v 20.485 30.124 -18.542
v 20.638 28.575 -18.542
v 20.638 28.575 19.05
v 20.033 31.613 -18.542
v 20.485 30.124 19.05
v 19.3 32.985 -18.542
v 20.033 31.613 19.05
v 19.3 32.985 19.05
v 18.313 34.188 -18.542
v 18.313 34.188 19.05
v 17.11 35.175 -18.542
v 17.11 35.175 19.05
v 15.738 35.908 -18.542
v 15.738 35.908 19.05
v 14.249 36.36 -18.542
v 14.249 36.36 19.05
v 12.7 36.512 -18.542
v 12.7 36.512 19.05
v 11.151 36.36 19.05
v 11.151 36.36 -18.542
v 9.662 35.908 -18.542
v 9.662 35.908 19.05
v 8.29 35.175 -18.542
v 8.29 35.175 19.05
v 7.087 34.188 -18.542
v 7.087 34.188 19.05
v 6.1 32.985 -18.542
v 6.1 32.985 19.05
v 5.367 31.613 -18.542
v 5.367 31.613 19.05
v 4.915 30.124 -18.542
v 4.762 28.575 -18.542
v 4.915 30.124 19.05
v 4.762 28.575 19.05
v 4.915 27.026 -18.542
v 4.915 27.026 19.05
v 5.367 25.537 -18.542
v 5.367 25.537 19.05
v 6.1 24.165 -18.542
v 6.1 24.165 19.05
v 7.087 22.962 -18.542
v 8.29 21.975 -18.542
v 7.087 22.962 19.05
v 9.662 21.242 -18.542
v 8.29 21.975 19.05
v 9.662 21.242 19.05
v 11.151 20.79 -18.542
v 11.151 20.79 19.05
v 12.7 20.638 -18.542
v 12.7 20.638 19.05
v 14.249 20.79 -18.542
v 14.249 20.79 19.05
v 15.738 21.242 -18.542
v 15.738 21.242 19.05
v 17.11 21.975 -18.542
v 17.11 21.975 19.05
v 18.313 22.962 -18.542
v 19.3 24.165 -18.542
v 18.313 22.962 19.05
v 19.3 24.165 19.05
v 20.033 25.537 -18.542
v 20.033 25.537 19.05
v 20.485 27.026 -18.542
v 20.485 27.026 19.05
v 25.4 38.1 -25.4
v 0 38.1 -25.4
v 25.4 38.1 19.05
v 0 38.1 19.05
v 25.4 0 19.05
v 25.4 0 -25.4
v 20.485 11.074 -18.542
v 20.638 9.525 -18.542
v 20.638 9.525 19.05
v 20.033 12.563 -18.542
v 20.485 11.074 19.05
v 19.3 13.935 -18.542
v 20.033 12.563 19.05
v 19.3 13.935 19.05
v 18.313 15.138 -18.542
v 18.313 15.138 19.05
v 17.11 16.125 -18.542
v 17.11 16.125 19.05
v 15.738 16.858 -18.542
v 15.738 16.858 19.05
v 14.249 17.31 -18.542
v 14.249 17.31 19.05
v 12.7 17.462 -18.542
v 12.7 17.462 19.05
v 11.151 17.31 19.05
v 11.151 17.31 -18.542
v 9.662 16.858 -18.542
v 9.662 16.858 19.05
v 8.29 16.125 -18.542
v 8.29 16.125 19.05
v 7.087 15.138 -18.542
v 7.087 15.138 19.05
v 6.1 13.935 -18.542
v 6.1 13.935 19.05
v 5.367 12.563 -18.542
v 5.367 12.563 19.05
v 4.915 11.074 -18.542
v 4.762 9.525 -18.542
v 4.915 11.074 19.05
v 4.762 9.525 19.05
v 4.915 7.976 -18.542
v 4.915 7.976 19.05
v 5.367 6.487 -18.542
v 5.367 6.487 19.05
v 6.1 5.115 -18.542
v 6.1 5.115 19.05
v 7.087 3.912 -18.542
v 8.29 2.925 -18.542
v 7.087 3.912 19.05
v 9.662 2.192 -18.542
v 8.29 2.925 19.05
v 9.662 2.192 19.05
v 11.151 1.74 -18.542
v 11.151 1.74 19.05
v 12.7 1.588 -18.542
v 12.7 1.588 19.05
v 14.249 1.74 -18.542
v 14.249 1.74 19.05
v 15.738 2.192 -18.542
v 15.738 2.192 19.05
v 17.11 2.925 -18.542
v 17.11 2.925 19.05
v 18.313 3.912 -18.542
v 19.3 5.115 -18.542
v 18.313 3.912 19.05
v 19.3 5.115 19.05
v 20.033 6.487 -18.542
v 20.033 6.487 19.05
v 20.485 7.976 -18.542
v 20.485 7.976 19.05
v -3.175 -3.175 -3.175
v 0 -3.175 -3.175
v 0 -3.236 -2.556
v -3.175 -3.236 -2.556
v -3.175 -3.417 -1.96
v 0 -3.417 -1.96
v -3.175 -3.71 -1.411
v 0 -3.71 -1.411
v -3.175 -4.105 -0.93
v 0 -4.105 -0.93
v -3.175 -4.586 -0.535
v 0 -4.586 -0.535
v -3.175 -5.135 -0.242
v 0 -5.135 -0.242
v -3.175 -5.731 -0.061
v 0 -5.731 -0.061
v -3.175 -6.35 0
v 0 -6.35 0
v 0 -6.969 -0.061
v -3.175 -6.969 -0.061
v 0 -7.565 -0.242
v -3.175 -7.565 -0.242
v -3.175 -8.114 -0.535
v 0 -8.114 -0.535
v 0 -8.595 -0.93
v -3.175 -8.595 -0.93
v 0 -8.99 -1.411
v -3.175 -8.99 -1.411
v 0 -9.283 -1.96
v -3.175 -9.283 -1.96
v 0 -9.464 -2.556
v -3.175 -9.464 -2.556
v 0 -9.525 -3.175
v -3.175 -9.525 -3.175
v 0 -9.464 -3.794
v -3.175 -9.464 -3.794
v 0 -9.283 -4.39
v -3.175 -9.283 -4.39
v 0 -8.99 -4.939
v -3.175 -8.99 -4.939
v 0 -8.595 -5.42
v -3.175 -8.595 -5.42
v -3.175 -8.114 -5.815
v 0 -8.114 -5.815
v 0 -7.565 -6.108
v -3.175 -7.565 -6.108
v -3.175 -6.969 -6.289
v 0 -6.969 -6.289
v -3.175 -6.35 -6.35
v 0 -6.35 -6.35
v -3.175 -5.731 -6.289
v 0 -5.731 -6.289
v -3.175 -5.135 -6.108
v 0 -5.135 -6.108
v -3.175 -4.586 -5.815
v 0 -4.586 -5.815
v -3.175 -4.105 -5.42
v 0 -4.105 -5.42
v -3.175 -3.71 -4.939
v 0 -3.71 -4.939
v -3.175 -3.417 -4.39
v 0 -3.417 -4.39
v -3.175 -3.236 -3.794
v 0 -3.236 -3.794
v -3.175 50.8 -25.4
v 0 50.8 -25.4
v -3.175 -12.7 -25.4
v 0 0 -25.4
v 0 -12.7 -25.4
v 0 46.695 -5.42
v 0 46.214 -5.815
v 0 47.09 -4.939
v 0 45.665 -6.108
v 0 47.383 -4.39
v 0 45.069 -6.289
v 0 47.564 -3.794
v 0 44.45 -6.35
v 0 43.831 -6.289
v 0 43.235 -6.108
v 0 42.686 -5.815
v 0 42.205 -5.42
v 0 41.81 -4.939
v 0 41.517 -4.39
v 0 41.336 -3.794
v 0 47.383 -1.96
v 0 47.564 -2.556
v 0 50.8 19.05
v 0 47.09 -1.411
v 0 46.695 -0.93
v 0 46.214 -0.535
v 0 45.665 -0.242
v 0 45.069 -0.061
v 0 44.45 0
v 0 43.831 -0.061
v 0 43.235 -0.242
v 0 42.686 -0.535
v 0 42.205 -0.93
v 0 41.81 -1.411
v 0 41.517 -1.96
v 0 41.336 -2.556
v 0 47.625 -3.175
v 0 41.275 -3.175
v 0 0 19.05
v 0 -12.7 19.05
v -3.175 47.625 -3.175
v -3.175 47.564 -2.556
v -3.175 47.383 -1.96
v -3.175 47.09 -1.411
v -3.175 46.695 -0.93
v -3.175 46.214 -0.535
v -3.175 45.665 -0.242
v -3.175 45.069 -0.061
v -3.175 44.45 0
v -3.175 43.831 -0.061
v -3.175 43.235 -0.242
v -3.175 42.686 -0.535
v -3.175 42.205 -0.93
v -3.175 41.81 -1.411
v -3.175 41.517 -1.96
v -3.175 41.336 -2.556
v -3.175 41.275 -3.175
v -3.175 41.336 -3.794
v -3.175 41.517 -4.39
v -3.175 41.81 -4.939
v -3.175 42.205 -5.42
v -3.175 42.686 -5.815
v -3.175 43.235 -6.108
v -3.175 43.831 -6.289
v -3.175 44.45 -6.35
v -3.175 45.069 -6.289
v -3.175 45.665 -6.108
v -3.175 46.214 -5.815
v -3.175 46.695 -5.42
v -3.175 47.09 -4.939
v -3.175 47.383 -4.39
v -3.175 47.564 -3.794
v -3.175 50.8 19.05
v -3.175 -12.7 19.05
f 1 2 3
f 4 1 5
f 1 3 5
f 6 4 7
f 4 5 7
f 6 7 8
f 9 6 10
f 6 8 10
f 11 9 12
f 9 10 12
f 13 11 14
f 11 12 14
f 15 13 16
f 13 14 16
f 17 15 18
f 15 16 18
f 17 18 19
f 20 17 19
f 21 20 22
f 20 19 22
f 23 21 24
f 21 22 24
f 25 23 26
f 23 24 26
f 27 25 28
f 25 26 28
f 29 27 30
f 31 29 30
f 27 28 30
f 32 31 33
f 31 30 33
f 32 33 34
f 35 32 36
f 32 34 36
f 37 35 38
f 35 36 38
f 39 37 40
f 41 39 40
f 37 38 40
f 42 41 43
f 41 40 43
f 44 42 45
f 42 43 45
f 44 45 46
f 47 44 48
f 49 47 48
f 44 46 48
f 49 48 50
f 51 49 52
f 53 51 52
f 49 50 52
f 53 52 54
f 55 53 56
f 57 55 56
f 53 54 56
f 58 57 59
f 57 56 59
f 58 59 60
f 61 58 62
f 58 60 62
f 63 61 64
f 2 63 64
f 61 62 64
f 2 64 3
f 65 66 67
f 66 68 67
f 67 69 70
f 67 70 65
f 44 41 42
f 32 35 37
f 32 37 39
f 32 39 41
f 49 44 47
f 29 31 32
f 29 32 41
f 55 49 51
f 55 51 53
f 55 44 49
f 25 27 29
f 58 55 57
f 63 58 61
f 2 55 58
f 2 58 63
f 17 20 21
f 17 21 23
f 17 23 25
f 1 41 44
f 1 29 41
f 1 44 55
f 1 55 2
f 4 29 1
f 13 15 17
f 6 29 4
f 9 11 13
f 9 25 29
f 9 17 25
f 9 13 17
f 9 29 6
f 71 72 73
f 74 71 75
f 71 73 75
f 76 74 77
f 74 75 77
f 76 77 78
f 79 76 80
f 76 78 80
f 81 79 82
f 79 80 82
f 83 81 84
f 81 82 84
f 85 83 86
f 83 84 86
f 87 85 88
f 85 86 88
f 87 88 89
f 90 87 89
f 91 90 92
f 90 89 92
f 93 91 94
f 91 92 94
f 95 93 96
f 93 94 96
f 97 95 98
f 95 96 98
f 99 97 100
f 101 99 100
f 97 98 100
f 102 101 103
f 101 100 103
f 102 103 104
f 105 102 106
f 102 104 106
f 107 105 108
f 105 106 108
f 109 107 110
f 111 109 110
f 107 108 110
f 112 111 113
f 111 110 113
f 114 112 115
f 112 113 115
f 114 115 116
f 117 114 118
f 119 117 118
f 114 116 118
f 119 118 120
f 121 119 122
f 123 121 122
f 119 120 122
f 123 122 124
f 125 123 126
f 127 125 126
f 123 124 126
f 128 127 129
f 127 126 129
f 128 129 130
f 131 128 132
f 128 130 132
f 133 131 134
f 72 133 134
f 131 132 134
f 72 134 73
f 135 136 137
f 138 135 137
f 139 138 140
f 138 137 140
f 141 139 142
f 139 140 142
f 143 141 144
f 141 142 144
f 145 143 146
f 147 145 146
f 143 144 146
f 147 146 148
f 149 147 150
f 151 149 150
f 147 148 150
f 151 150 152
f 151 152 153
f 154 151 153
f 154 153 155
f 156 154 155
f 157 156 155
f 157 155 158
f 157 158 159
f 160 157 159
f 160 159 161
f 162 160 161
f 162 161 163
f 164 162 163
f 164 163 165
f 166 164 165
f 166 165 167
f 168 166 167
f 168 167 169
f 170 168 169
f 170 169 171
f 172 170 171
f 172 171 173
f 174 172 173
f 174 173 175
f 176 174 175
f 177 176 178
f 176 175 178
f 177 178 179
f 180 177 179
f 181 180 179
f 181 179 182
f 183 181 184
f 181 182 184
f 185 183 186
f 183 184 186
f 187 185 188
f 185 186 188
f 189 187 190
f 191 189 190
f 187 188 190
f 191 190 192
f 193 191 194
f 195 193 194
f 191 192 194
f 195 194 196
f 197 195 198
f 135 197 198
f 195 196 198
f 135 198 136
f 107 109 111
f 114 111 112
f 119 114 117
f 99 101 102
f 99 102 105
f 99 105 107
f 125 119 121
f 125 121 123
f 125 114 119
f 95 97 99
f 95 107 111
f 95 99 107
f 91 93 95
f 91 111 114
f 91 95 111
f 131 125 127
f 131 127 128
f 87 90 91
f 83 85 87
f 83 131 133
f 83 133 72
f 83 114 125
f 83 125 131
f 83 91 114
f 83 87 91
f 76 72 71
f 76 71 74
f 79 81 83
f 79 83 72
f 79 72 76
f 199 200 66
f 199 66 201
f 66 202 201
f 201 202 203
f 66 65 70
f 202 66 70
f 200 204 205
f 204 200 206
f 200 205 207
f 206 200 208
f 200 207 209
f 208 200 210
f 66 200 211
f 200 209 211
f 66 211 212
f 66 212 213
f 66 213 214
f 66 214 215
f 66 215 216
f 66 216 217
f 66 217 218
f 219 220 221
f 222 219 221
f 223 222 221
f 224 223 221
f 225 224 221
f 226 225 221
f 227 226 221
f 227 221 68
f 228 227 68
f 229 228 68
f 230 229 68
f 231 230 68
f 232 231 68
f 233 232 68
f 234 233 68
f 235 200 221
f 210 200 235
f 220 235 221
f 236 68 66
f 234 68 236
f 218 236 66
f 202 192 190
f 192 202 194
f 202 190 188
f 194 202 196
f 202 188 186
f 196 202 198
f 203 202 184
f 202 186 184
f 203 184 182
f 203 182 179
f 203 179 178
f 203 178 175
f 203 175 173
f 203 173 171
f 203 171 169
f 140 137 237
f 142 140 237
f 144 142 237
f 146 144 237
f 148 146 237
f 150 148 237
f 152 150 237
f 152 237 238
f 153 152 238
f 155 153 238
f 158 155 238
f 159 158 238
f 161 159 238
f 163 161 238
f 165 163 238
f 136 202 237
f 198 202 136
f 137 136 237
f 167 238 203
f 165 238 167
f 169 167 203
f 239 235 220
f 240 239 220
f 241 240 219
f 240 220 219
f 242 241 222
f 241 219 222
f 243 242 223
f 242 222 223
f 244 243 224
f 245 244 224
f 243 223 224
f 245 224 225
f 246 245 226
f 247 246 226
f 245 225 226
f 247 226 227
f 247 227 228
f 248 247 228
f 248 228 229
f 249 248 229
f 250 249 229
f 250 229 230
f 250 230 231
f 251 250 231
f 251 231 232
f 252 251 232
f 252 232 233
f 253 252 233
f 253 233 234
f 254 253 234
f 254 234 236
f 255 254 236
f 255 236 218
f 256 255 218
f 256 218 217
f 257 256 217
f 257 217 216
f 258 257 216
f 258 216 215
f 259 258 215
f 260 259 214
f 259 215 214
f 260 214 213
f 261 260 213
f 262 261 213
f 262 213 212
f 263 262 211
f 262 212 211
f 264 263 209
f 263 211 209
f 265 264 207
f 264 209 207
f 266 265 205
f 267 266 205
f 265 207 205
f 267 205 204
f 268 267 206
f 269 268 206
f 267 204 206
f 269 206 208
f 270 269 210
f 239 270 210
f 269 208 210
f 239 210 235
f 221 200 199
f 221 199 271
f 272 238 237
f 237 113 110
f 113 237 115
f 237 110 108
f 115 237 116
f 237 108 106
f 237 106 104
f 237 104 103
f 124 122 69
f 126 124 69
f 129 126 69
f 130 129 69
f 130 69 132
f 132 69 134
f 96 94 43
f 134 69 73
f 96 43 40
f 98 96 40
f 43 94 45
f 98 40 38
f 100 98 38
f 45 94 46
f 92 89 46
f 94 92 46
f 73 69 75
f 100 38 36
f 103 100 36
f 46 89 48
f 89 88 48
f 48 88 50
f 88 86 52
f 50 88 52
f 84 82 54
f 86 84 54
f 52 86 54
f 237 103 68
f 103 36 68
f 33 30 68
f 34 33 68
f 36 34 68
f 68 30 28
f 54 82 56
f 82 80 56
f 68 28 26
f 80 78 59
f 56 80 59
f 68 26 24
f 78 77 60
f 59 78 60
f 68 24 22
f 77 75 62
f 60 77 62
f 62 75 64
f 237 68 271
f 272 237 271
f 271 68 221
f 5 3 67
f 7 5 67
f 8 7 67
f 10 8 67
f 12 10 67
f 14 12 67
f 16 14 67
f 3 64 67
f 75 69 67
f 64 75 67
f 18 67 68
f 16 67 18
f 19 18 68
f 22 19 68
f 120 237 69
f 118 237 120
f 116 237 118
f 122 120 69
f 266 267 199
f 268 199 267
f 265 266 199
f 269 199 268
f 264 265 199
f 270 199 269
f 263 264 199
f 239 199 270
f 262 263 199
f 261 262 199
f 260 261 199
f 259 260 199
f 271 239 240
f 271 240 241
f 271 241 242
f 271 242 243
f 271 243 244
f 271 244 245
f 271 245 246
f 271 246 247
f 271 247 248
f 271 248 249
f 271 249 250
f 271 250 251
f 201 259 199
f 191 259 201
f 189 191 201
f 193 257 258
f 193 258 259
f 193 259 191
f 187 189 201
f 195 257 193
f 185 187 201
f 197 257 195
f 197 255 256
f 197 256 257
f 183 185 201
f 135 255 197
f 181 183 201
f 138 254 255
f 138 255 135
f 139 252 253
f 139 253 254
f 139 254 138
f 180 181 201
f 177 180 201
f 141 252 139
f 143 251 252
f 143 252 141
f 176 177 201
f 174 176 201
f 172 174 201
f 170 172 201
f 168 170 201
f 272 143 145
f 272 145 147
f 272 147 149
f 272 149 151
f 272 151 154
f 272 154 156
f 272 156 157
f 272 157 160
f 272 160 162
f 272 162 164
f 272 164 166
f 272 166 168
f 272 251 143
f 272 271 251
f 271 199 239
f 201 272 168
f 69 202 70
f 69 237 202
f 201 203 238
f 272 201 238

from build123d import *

# Parameters (mm, degrees)
F0_W     = 38.1
F0_H     = 19.05
F1_DEPTH = 25.4
F3_DEPTH = 25.4
F2_R     = 7.9375
F4_DEPTH = 37.592
F5_W     = 12.7
F5_H     = 44.45
F5_W_2   = 38.1
F6_DEPTH = 3.175
F8_R     = 3.175
F7_R     = 3.175
F9_DEPTH = 25.4


with BuildPart() as f1:
    # F0 (on Right) → F1 (new body)
    with BuildSketch(Plane.YZ):
        with Locations((19.05, 9.525)):
            Rectangle(F0_W, F0_H)
    extrude(amount=F1_DEPTH)

    # F3 (add): a face of the model
    f3_faces = [f1.faces().sort_by_distance(p)[0] for p in [
        (12.7, 19.05, 0),
    ]]
    extrude(f3_faces, amount=F3_DEPTH)

    # F2 (on face) → F4 (cut)
    with BuildSketch(Plane.XY.offset(19.05)):
        with Locations((12.7, 28.575)):
            Circle(F2_R)
        with Locations((12.7, 9.525)):
            Circle(F2_R)
    extrude(amount=-F4_DEPTH, mode=Mode.SUBTRACT)

    # F5 (on face) → F6 (join)
    with BuildSketch(Plane(origin=(0, 0, 0), x_dir=(0, -1, 0), z_dir=(-1, 0, 0))):
        with Locations((-44.45, -3.175)):
            Rectangle(F5_W, F5_H)
        with Locations((-19.05, -3.175)):
            Rectangle(F5_W_2, F5_H)
        with Locations((6.35, -3.175)):
            Rectangle(F5_W, F5_H)
    extrude(amount=F6_DEPTH)

    # F8 (on face) + F7 (on face) → F9 (cut)
    with BuildSketch(Plane.YZ):
        with Locations((-6.35, -3.175)):
            Circle(F8_R)
    with BuildSketch(Plane.YZ):
        with Locations((44.45, -3.175)):
            Circle(F7_R)
    extrude(amount=-F9_DEPTH, mode=Mode.SUBTRACT)


solid = f1.part
